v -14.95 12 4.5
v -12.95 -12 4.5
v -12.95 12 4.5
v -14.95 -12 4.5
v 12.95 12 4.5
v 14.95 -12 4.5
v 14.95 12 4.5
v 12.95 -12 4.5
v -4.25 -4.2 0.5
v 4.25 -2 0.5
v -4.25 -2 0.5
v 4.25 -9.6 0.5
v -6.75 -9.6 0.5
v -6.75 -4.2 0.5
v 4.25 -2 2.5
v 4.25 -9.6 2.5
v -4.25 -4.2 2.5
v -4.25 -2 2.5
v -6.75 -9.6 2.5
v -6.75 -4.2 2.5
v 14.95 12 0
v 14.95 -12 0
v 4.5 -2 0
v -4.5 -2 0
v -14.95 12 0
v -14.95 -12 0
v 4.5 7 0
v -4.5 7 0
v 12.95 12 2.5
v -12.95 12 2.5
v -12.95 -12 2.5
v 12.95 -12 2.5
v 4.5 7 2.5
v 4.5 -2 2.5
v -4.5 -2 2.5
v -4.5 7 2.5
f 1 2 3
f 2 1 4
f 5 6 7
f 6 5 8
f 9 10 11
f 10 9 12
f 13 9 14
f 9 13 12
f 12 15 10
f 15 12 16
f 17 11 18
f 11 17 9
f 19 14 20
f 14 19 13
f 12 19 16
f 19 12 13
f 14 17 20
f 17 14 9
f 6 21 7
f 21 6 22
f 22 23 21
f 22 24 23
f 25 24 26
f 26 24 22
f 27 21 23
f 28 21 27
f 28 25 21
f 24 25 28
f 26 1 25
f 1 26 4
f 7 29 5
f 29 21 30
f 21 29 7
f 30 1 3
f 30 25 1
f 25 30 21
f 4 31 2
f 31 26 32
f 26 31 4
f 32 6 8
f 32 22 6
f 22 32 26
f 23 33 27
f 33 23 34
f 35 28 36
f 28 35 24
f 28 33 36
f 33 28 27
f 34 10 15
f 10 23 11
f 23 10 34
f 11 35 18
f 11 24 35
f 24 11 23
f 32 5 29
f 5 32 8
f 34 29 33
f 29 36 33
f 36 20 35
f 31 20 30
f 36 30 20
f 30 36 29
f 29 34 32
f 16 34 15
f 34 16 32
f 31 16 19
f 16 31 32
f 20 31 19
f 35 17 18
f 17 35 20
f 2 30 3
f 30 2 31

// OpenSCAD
/******************************************************************
*                                                                 *
* OpenFlexure Microscope: Tools to help remove the pi camera lens *
*                                                                 *
* This is part of the OpenFlexure microscope, an open-source      *
* microscope and 3-axis translation stage.  It gets really good   *
* precision over a ~10mm range, by using plastic flexure          *
* mechanisms.                                                     *
*                                                                 *
* (c) Richard Bowman, January 2016                                *
* Released under the CERN Open Hardware License                   *
*                                                                 *
******************************************************************/

use <utilities.scad>;

d=0.05;

pcb = [25.4+0.5,24+0.5,2]; //size of the picam PCB (+0.5mm so it fits)
camera_housing = [9,9,2.5]; //size of the plastic housing
camera_housing_y = 2.5; //shift of the camera housing from the centre
lens_unscrew_r = 5.5/2; //size of the bit we unscrew
    
module generous_camera_bits(){
    //The other stuff on the PCB (mostly the ribbon cable)
    camera = [8.5,8.5,2.3]; //size of camera box
	cw = camera[0]+1; //side length of camera box at bottom (slightly larger)
	union(){
		//ribbon cable at top of camera
        sequential_hull(){
            translate([0,0,0]) cube([cw-1,d,4],center=true);
            translate([0,9.4-(4.4/1)/2,0]) cube([cw-1,1,4],center=true);
        }
        //flex connector
        translate([-1.25,9.4,0]) cube([cw-1+2.5, 4.4+1, 4],center=true);
        
	}
}

module picam_holder(){
    // this little bit of plastic grips the plastic camera housing
    // and allows you to safely unscrew the lens
    // it protects the (surprisingly delicate) flex that connects the camera to the PCB.
    outer = pcb+[4,-0.5,camera_housing[2]]; //size of the tool
    difference(){
        translate([0,0,outer[2]/2]) cube(outer, center=true);
        
        //central hole for the camera housing
        translate([0,camera_housing_y,0]) cube(camera_housing + [0,0,999],center=true);
        
        //cut-outs for the other bits (cable etc.)
        translate([0,camera_housing_y,camera_housing[2]]) rotate([180,0,0]) generous_camera_bits();
        
        //indent for PCB
        translate([0,0,outer[2]]) cube(pcb + [0,0,pcb[2]],center=true);
    
    }
}

module picam_lens_gripper(){
    //a tool to unscrew the lens from the pi camera
    inner_r = 4.7/2;
    union(){
        difference(){
            cylinder(r=7,h=2);
            cylinder(r=5,h=999,center=true);
        }
        for(a=[0,90,180,270]) rotate(a) translate([inner_r,0,0]) cube([1.5,5,2]);
    }
}

module hold_gear_10mm_higher(){
    union(){
        difference(){
            cylinder(r=6,h=10,$fn=24);
            cylinder(r=3,h=999,center=true,$fn=12);
            translate([-999,0,-999]) cube([1,1,1]*9999);
        }
        reflect([1,0,0]) translate([4.5,0,0]) hull()
            repeat([0,3,0],2) cylinder(r=1.5,h=10,$fn=12);
    }
}
//hold_gear_10mm_higher();
//translate([pcb[0]/2+15,pcb[1]/2,0]) 
picam_holder();
//picam_lens_pliers();
//picam_lens_gripper();
